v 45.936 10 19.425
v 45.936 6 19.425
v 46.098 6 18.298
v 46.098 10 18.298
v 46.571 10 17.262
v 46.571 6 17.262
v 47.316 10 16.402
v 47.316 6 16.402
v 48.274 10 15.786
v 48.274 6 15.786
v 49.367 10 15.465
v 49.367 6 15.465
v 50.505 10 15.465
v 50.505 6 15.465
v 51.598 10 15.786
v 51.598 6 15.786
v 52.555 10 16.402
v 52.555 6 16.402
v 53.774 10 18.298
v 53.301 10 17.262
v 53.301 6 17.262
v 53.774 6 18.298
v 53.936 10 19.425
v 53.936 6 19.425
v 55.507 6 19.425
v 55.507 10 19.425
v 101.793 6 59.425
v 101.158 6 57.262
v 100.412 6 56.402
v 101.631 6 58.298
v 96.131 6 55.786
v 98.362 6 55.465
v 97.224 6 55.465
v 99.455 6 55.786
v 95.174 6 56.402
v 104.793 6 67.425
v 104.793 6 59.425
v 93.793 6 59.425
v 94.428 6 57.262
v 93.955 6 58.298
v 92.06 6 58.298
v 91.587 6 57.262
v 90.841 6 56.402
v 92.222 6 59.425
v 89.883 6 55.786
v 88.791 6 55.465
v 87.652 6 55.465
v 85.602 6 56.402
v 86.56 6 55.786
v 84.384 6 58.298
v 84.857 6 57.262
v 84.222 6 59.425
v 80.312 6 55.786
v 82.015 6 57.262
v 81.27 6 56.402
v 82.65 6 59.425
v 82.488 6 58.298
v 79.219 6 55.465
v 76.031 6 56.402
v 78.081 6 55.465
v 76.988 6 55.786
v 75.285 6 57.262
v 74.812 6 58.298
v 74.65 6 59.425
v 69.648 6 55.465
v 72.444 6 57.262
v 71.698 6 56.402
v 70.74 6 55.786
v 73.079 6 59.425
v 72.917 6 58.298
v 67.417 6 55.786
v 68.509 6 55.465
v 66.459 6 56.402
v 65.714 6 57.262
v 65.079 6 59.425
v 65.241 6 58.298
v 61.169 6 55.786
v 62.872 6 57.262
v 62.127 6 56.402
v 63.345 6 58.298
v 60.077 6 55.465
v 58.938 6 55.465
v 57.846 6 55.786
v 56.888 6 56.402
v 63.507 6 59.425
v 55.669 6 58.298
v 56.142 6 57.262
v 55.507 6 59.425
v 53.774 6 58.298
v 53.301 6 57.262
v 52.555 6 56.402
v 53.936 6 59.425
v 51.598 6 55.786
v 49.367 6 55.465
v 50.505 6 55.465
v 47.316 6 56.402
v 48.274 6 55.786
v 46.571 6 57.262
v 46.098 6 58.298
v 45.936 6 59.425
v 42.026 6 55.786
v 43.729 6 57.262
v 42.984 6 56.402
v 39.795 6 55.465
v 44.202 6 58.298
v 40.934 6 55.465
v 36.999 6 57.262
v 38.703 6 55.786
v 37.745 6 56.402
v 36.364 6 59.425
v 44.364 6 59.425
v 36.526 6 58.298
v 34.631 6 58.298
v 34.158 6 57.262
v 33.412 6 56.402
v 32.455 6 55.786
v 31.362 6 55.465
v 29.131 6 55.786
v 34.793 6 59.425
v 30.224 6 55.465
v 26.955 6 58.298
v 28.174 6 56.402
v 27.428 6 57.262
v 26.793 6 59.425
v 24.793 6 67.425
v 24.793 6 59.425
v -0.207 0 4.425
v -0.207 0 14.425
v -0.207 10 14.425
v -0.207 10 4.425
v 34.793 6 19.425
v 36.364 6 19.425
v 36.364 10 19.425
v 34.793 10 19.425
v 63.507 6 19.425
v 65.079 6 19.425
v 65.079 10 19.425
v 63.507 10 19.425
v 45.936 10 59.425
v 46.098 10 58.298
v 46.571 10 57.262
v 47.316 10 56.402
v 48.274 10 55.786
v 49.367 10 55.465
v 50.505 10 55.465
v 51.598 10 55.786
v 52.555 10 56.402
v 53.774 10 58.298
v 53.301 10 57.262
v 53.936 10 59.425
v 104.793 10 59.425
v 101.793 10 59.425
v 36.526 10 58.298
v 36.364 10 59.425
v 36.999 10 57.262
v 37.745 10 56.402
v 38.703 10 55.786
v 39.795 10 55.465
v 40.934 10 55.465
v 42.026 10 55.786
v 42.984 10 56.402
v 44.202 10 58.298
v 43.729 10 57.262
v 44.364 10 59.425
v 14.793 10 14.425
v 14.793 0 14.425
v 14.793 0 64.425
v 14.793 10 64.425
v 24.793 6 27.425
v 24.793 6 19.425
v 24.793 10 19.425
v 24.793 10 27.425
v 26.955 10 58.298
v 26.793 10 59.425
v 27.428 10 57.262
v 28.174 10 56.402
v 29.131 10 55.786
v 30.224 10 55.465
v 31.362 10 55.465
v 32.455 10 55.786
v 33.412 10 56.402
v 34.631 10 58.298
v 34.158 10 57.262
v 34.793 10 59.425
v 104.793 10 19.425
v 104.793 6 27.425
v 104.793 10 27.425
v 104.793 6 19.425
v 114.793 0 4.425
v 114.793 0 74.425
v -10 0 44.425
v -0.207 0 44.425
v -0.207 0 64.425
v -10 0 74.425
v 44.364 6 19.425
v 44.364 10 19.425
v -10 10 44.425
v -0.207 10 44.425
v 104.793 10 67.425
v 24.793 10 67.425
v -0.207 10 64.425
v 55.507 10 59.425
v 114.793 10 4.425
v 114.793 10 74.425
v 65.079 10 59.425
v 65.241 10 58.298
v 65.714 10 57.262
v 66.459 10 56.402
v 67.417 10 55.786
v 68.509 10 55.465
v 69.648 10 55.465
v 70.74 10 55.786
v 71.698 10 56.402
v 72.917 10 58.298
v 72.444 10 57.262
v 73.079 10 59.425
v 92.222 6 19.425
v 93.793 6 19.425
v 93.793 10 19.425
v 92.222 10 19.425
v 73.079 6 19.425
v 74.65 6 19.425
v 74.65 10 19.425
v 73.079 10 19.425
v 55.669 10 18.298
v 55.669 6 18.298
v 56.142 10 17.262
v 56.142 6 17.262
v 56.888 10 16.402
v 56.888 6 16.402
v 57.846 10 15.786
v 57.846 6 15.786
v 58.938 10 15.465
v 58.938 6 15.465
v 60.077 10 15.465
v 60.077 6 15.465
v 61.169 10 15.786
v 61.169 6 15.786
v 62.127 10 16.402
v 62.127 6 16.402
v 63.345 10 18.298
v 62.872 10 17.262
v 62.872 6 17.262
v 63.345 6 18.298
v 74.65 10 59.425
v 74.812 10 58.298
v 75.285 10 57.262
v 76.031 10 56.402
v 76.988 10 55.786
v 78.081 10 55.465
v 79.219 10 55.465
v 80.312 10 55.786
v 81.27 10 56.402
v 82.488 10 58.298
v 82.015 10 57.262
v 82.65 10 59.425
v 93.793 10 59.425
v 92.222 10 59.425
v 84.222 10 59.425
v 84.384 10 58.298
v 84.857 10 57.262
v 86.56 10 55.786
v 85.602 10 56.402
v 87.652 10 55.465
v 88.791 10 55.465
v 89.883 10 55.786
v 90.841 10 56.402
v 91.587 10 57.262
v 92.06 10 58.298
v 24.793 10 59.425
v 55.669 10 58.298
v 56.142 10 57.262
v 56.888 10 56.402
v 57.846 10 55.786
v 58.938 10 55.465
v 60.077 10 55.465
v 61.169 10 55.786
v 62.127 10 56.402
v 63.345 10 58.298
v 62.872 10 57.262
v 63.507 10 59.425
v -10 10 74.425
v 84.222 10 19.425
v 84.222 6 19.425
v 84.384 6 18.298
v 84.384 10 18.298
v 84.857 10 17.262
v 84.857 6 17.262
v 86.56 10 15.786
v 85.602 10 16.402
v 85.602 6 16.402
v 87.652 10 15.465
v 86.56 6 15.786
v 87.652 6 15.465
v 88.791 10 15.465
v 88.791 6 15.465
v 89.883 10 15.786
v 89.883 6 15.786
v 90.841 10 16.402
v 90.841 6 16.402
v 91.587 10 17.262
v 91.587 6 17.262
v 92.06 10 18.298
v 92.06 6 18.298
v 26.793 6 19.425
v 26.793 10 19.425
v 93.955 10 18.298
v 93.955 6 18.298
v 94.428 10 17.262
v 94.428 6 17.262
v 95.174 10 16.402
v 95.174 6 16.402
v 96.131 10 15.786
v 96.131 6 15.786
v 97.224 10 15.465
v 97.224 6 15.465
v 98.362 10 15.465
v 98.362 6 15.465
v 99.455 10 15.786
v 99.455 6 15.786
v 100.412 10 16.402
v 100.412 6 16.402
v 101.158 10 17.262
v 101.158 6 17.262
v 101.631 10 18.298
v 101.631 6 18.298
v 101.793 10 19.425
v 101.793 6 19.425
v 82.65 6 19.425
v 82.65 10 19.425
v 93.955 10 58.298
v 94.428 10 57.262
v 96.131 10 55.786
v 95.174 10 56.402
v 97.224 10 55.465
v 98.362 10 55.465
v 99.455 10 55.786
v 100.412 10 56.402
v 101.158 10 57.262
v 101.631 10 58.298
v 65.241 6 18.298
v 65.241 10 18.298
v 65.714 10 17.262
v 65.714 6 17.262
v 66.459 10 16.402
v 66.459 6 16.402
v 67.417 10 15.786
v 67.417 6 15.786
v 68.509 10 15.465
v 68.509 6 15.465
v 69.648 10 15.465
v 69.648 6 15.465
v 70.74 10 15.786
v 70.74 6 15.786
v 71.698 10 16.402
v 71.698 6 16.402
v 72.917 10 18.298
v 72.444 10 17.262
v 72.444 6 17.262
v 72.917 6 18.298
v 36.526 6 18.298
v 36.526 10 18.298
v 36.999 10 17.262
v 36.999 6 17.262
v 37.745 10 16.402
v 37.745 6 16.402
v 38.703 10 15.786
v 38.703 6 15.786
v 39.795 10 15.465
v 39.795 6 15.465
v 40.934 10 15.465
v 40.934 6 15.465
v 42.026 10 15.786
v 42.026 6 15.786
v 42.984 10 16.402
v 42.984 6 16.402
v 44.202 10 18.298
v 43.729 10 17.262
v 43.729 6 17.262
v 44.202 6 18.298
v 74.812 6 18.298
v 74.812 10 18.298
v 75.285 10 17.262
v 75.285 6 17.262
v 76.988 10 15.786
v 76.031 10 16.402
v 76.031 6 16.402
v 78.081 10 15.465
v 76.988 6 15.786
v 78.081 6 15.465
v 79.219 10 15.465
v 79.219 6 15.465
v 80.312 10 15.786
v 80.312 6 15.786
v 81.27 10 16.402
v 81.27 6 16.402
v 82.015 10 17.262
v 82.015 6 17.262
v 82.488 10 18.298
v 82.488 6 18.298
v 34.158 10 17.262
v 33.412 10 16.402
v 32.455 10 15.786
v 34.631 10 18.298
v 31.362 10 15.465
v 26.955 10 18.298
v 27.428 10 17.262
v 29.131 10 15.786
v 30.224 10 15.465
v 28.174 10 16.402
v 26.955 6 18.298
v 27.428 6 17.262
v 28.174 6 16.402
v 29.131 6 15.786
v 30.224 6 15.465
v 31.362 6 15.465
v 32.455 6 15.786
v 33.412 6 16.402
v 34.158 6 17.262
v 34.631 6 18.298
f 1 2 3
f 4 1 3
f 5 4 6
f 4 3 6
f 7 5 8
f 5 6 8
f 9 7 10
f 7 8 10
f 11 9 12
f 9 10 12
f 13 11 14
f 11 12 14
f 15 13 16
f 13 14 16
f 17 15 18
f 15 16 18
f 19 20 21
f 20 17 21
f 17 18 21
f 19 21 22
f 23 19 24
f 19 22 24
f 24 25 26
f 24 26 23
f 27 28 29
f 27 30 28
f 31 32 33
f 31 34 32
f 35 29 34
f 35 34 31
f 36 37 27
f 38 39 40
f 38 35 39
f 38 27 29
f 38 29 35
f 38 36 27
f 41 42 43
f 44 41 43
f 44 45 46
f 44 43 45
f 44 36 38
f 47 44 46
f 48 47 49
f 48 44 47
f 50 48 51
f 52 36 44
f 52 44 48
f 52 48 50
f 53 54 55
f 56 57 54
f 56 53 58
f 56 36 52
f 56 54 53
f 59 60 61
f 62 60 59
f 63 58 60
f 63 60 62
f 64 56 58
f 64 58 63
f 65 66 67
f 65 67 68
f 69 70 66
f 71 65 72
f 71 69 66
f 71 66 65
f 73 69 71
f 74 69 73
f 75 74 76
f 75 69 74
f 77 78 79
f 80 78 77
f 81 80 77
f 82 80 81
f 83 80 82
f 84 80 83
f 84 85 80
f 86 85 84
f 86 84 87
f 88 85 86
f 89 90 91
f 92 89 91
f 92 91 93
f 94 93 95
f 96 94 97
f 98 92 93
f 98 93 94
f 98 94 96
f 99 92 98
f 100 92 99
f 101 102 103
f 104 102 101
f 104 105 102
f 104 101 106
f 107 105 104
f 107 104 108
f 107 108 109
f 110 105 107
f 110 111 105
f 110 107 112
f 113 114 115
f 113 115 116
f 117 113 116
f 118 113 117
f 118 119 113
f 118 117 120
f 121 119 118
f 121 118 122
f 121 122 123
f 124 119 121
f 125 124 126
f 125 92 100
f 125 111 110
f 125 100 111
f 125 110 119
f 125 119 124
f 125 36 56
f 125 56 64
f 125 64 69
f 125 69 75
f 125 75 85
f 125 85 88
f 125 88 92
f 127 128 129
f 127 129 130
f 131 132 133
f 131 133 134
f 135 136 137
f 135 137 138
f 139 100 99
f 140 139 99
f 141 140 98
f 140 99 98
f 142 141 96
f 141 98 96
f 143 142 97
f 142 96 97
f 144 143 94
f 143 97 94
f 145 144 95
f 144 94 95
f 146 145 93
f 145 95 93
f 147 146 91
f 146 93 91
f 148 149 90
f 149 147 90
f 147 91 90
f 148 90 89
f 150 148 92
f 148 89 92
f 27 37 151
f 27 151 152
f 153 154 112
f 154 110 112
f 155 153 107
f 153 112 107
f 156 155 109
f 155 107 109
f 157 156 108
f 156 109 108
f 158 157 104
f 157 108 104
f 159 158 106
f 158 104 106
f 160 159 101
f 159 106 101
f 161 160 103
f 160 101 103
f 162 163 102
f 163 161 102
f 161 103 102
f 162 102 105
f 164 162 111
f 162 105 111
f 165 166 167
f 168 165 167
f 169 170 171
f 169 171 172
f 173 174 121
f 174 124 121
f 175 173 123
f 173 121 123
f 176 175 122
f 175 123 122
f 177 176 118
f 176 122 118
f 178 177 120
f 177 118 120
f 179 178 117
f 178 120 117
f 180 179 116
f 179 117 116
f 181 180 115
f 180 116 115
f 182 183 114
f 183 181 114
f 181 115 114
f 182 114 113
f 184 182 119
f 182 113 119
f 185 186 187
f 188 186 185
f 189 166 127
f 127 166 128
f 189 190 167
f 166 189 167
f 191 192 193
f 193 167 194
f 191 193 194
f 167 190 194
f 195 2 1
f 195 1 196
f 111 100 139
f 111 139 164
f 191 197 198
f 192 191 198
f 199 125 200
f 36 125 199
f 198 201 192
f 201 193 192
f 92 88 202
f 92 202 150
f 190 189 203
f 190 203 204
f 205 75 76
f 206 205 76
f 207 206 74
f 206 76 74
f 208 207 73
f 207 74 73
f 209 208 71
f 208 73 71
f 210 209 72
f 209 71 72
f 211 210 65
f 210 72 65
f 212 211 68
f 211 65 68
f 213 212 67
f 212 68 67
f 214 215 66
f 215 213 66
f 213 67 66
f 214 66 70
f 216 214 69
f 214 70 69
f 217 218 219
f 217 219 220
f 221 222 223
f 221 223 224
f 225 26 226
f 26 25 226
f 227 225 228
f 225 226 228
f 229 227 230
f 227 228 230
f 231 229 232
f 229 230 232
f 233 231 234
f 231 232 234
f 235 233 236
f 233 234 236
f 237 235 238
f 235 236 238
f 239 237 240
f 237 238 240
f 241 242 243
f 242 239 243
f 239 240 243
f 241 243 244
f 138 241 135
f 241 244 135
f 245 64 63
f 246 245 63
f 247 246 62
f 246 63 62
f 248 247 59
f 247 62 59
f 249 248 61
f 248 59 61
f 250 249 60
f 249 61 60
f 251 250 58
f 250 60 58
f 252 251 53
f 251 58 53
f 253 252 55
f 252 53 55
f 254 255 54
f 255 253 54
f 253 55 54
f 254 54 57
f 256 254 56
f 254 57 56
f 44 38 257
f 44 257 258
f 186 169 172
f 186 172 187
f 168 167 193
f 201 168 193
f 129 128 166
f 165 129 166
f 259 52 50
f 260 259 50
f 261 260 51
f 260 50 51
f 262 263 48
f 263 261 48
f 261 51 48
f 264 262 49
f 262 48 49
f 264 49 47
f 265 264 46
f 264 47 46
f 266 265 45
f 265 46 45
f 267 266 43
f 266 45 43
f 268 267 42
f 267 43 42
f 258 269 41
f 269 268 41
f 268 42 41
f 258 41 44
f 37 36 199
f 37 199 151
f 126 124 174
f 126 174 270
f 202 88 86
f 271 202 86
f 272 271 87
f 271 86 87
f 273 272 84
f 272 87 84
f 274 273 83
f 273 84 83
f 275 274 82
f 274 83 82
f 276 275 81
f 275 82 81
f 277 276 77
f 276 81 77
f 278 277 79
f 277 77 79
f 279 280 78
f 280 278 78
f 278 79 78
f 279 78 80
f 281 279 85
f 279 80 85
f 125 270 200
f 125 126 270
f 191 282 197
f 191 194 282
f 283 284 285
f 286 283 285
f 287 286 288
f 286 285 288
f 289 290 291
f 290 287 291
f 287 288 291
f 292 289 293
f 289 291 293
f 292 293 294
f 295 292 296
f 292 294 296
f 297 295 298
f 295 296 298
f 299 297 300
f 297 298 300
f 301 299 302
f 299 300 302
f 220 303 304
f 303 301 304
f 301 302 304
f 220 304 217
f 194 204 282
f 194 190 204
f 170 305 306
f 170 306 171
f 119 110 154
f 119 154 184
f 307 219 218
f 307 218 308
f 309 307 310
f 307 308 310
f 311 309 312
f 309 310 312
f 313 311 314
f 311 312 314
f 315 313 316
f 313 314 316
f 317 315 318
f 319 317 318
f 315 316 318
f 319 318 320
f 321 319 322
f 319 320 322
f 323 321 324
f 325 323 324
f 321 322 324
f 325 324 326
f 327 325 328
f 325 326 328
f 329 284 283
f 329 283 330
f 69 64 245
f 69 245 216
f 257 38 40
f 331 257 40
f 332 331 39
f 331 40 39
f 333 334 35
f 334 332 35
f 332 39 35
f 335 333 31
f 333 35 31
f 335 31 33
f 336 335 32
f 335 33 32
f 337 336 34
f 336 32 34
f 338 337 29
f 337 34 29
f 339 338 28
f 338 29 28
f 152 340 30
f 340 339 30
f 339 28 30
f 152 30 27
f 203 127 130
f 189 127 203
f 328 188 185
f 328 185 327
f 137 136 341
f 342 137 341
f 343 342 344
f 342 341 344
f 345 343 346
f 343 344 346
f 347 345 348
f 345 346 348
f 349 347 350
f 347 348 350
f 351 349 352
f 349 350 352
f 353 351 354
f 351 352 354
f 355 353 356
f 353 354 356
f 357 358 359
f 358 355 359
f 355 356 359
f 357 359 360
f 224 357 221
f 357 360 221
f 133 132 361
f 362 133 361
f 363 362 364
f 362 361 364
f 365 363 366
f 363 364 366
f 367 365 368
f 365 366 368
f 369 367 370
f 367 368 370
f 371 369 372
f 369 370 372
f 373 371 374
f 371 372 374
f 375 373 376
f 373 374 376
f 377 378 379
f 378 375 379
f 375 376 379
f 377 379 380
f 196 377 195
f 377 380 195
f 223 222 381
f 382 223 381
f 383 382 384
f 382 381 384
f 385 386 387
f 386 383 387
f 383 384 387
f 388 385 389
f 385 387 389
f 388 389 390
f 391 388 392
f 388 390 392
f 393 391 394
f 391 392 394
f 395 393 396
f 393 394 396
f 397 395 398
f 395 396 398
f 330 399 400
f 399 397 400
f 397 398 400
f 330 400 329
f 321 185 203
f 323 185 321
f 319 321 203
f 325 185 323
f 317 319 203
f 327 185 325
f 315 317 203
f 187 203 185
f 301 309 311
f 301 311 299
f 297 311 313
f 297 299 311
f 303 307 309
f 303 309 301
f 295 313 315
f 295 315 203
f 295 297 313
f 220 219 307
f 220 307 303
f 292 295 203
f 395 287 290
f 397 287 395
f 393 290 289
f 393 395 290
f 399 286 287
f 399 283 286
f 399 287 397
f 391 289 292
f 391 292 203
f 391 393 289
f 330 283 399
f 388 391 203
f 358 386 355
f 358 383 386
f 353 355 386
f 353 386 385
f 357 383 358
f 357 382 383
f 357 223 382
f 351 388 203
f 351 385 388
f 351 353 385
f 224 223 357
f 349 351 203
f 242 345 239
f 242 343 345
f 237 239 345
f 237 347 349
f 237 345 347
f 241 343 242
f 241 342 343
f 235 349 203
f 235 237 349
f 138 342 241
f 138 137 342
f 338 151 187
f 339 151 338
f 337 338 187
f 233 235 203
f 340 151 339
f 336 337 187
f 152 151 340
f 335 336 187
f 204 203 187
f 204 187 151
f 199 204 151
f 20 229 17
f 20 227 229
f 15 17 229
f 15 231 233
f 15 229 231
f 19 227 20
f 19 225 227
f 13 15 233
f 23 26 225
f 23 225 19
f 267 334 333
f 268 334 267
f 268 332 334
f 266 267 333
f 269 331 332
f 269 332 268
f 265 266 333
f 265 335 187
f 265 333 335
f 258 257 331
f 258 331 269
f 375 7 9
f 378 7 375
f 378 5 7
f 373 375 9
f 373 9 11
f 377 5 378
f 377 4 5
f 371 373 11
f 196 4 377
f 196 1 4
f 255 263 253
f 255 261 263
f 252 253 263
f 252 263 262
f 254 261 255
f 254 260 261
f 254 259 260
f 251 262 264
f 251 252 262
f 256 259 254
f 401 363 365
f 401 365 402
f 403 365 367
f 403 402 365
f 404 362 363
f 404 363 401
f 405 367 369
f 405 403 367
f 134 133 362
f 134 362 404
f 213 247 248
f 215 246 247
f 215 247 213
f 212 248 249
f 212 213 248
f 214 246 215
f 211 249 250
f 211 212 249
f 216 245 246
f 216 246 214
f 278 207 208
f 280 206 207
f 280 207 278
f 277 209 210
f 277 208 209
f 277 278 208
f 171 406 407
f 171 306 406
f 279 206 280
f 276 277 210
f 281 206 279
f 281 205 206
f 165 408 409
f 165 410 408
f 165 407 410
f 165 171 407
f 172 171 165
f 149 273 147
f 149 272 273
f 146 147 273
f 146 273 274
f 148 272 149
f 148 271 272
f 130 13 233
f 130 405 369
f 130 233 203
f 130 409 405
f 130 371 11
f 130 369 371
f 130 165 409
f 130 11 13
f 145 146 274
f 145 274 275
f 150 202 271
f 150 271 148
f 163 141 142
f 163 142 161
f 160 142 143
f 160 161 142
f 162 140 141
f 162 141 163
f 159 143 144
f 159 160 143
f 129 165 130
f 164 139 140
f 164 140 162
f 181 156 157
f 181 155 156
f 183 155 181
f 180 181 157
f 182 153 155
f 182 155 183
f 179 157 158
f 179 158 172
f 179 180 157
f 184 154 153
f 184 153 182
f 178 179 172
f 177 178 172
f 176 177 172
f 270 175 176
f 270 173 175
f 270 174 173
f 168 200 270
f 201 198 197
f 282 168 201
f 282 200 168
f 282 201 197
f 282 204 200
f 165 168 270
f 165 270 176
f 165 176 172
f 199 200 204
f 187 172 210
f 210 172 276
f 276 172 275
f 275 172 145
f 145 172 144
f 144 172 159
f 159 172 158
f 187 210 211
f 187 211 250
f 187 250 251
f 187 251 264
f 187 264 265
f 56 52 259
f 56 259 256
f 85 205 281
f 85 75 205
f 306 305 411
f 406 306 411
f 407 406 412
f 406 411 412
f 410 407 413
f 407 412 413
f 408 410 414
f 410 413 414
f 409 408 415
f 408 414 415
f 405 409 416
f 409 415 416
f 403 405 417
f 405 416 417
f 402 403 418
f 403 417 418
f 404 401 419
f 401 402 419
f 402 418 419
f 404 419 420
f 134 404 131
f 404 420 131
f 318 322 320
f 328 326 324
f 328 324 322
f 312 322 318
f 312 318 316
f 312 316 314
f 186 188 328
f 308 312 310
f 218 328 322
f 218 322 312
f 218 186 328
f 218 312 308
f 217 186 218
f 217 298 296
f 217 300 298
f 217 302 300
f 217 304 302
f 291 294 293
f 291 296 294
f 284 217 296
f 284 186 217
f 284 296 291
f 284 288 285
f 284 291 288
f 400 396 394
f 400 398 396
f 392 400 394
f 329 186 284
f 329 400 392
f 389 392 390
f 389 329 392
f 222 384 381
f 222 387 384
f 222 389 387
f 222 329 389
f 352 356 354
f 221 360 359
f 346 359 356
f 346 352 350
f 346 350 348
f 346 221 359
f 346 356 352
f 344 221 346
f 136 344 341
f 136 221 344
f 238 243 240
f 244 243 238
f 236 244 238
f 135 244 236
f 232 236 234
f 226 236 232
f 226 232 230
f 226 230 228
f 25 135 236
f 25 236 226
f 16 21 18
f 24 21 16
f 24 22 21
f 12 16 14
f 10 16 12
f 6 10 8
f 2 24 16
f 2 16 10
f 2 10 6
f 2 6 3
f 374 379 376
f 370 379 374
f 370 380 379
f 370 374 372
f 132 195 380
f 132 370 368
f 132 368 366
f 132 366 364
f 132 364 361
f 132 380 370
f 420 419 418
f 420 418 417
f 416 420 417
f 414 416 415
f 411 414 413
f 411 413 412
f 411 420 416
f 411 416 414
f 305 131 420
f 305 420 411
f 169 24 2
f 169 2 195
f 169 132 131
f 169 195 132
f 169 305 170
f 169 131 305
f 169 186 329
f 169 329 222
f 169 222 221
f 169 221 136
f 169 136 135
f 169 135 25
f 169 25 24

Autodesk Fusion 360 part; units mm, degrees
sketch "Sketch 1" plane through (0, 0, 0) normal (0, 1, 0) x (-1, 0, 0)
  line L0 (0.207, 14.4246) -> (-14.793, 14.4246)
  line L1 (0.207, 64.4246) -> (0.207, 14.4246)
  line L2 (-14.793, 14.4246) -> (-14.793, 64.4246)
  line L3 (-14.793, 64.4246) -> (0.207, 64.4246)
  line L4 (-92.925, 5.6402) -> (-78.1529, 8.2449)
  line L5 (-78.1529, 8.2449) -> (-89.7874, 74.227)
  line L6 (-104.5595, 71.6223) -> (-92.925, 5.6402)
  line L7 (-89.7874, 74.227) -> (-104.5595, 71.6223)
  circle A0 centre (-94.793, 59.4246) radius 4
  circle A1 centre (-87.7399, 19.4246) radius 4
  line L8 (0.207, 4.4246) -> (-114.793, 4.4246)
  line L9 (-114.793, 4.4246) -> (-114.793, 74.4246)
  line L10 (-114.793, 74.4246) -> (0.207, 74.4246)
  line L11 (0.207, 74.4246) -> (0.207, 4.4246)
  line L12 (0.207, 74.4246) -> (10, 74.4246)
  line L13 (10, 74.4246) -> (10, 44.4246)
  line L14 (10, 44.4246) -> (0.207, 44.4246)
  line L15 (0.207, 44.4246) -> (0.207, 74.4246)
  line L16 (-24.793, 67.4246) -> (-104.793, 67.4246)
  line L17 (-104.793, 67.4246) -> (-104.793, 51.4246)
  line L18 (-104.793, 51.4246) -> (-24.793, 51.4246)
  line L19 (-24.793, 51.4246) -> (-24.793, 67.4246)
  line L20 (-24.793, 27.4246) -> (-104.793, 27.4246)
  line L21 (-104.793, 27.4246) -> (-104.793, 11.4246)
  line L22 (-104.793, 11.4246) -> (-24.793, 11.4246)
  line L23 (-24.793, 11.4246) -> (-24.793, 27.4246)
  line L24 (-24.793, 51.4246) -> (-104.793, 51.4246)
  line L25 (-104.793, 51.4246) -> (-104.793, 59.4246)
  line L26 (-104.793, 59.4246) -> (-24.793, 59.4246)
  line L27 (-24.793, 59.4246) -> (-24.793, 51.4246)
  line L28 (-24.793, 11.4246) -> (-104.793, 11.4246)
  line L29 (-104.793, 11.4246) -> (-104.793, 19.4246)
  line L30 (-104.793, 19.4246) -> (-24.793, 19.4246)
  line L31 (-24.793, 19.4246) -> (-24.793, 11.4246)
  circle A2 centre (-30.793, 59.4246) radius 4
  circle A3 centre (-40.3644, 59.4246) radius 4
  circle A4 centre (-49.9359, 59.4246) radius 4
  circle A5 centre (-59.5073, 59.4246) radius 4
  circle A6 centre (-69.0787, 59.4246) radius 4
  circle A7 centre (-78.6501, 59.4246) radius 4
  circle A8 centre (-88.2216, 59.4246) radius 4
  circle A9 centre (-97.793, 59.4246) radius 4
  circle A10 centre (-30.793, 19.4246) radius 4
  circle A11 centre (-40.3644, 19.4246) radius 4
  circle A12 centre (-49.9359, 19.4246) radius 4
  circle A13 centre (-59.5073, 19.4246) radius 4
  circle A14 centre (-69.0787, 19.4246) radius 4
  circle A15 centre (-78.6501, 19.4246) radius 4
  circle A16 centre (-88.2216, 19.4246) radius 4
  circle A17 centre (-97.793, 19.4246) radius 4
  point P0 (-97.1734, 72.9246)
  dimension "d9" = 15
  dimension "d10" = 50
  dimension "d11" = 15
  dimension "d12" = 67
  dimension "d13" = 8
  dimension "d14" = 7.5
  dimension "d15" = 8
  dimension "d17" = 7.5
  dimension "d18" = 40
  dimension "d19" = 13.5
  dimension "d22" = 10
  dimension "d23" = 10
  dimension "d24" = 80
  dimension "d25" = 100
  dimension "d27" = 30
  dimension "d28" = 80
  dimension "d29" = 16
  dimension "d30" = 10
  dimension "d31" = 80
  dimension "d32" = 16
  dimension "d33" = 10
  dimension "d35" = 10
  dimension "d36" = 8
  dimension "d37" = 8
  dimension "d38" = 7
  dimension "d39" = 8
  dimension "d42" = -67
  dimension "d43" = 0
  dimension "d44" = 6
  dimension "d45" = 8
  dimension "d46" = 6
  dimension "d49" = -67
  dimension "d50" = 0
extrude "Extrude3" add sketch "Sketch 1" along normal blind 200 contours L0 L1 L2 L3 L11 L15 | L4 L5 L6 L22 L28 | L5 L6 A1 L22 L28 L30 A15 A16 A17 | L6 L30 A17 | L5 L30 A15 | L6 L30 A17 | L5 L6 A1 L20 L30 A15 A16 A17 | L5 L30 A15 | A1 L30 A16 | A1 L30 A16 | L5 L6 L18 L20 L24 | L5 L6 A0 L18 L24 L26 A8 A9 | L5 L6 A0 L16 L26 A8 A9 | L5 A0 L26 A8 | L5 L6 L7 L16 | A0 L26 A9 | A0 L26 A9 | L5 A0 L26 A8 picked at (-94.3244, 19.2578) picked at (-81.7956, 19.242) picked at (-94.3265, 19.6077) picked at (-81.7939, 19.6192) picked at (-91.9756, 20.1938) picked at (-91.9756, 18.6555) picked at (-99.7654, 59.8073) picked at (-99.7654, 59.042) makes body 1 at (14.793, 66.6667, 31.0913) makes body 2 at (100.6813, 66.6667, 49.6282)
extrude "Extrude4" add sketch "Sketch 1" along normal blind 10 separate body contours L0 L2 L3 L8 L9 L10 L11 L15 | L1 L11 L12 L13 L14 L15 | L4 L5 L6 L22 L28 | L6 L21 L22 L28 L29 L30 A17 | L5 L6 A1 L22 L28 L30 A15 A16 A17 | L5 L22 L23 L28 L30 L31 A10 A11 A12 A13 A14 A15 | L6 L30 A17 | L6 L30 A17 | L5 L30 A15 | L5 L30 A15 | L6 L30 A17 | L6 L30 A17 | L6 L20 L21 L30 A17 | L5 L6 A1 L20 L30 A15 A16 A17 | L5 L30 A15 | L5 L30 A15 | L5 L20 L23 L30 A10 A11 A12 A13 A14 A15 | A1 L30 A16 | A1 L30 A16 | A1 L30 A16 | A1 L30 A16 | L30 A14 | L30 A14 | L30 A10 | L30 A10 | L5 L6 L18 L20 L24 | A1 L30 A16 | A1 L30 A16 | L6 L17 L18 L24 L25 L26 | L5 L6 A0 L18 L24 L26 A8 A9 | L5 L18 L19 L24 L26 L27 A2 A3 A4 A5 A6 A7 A8 | L30 A13 | L30 A13 | L30 A11 | L30 A11 | L6 L16 L17 L26 | L5 L6 A0 L16 L26 A8 A9 | L5 A0 L26 A8 | L5 L26 A8 | L5 L6 L7 L16 | A0 L26 A9 | A0 L26 A9 | L5 A0 L26 A8 | L5 L26 A8 | A0 L26 A8 | A0 L26 A8 A9 | L5 L16 L19 L26 A2 A3 A4 A5 A6 A7 A8 | L30 A12 | L30 A12 | A0 L26 A9 | A0 L26 A9 | A0 L26 A8 A9 | A0 L26 A8 | L26 A7 | L26 A7 | L26 A2 | L26 A2 | L26 A6 | L26 A6 | L26 A3 | L26 A3 | L26 A5 | L26 A5 | L26 A4 | L26 A4 makes body 3
extrude "Extrude5" cut sketch "Sketch 1" along normal blind 4 from surface at 6 contours L6 L16 L17 L26 | L5 L6 A0 L16 L26 A8 A9 | L5 A0 L26 A8 | L5 L26 A8 | A0 L26 A9 | A0 L26 A9 | L5 A0 L26 A8 | L5 L26 A8 | A0 L26 A8 | L5 L16 L19 L26 A2 A3 A4 A5 A6 A7 A8 | A0 L26 A9 | A0 L26 A9 | A0 L26 A8 A9 | A0 L26 A8 | L26 A7 | L26 A7 | L26 A2 | L26 A2 | L26 A6 | L26 A6 | L26 A3 | L26 A3 | L26 A5 | L26 A5 | L26 A4 | L26 A4 picked at (-92.8229, 61.5231) bodies 3
extrude "Extrude6" cut sketch "Sketch 1" along normal blind 4 from surface at 6 contours L6 L30 A17 | L6 L30 A17 | L5 L30 A15 | L5 L30 A15 | L6 L30 A17 | L6 L30 A17 | L6 L20 L21 L30 A17 | L5 L6 A1 L20 L30 A15 A16 A17 | L5 L30 A15 | L5 L30 A15 | L5 L20 L23 L30 A10 A11 A12 A13 A14 A15 | A1 L30 A16 | A1 L30 A16 | A1 L30 A16 | L30 A14 | L30 A14 | L30 A10 | L30 A10 | A1 L30 A16 | A1 L30 A16 | L30 A13 | L30 A13 | L30 A11 | L30 A11 | L30 A12 | L30 A12 picked at (-91.9756, 20.1938) picked at (-91.9756, 18.6555) picked at (-83.9859, 20.1938) picked at (-89.2213, 19.2421) picked at (-89.2213, 19.6072) bodies 3
hidden bodies 1 2
